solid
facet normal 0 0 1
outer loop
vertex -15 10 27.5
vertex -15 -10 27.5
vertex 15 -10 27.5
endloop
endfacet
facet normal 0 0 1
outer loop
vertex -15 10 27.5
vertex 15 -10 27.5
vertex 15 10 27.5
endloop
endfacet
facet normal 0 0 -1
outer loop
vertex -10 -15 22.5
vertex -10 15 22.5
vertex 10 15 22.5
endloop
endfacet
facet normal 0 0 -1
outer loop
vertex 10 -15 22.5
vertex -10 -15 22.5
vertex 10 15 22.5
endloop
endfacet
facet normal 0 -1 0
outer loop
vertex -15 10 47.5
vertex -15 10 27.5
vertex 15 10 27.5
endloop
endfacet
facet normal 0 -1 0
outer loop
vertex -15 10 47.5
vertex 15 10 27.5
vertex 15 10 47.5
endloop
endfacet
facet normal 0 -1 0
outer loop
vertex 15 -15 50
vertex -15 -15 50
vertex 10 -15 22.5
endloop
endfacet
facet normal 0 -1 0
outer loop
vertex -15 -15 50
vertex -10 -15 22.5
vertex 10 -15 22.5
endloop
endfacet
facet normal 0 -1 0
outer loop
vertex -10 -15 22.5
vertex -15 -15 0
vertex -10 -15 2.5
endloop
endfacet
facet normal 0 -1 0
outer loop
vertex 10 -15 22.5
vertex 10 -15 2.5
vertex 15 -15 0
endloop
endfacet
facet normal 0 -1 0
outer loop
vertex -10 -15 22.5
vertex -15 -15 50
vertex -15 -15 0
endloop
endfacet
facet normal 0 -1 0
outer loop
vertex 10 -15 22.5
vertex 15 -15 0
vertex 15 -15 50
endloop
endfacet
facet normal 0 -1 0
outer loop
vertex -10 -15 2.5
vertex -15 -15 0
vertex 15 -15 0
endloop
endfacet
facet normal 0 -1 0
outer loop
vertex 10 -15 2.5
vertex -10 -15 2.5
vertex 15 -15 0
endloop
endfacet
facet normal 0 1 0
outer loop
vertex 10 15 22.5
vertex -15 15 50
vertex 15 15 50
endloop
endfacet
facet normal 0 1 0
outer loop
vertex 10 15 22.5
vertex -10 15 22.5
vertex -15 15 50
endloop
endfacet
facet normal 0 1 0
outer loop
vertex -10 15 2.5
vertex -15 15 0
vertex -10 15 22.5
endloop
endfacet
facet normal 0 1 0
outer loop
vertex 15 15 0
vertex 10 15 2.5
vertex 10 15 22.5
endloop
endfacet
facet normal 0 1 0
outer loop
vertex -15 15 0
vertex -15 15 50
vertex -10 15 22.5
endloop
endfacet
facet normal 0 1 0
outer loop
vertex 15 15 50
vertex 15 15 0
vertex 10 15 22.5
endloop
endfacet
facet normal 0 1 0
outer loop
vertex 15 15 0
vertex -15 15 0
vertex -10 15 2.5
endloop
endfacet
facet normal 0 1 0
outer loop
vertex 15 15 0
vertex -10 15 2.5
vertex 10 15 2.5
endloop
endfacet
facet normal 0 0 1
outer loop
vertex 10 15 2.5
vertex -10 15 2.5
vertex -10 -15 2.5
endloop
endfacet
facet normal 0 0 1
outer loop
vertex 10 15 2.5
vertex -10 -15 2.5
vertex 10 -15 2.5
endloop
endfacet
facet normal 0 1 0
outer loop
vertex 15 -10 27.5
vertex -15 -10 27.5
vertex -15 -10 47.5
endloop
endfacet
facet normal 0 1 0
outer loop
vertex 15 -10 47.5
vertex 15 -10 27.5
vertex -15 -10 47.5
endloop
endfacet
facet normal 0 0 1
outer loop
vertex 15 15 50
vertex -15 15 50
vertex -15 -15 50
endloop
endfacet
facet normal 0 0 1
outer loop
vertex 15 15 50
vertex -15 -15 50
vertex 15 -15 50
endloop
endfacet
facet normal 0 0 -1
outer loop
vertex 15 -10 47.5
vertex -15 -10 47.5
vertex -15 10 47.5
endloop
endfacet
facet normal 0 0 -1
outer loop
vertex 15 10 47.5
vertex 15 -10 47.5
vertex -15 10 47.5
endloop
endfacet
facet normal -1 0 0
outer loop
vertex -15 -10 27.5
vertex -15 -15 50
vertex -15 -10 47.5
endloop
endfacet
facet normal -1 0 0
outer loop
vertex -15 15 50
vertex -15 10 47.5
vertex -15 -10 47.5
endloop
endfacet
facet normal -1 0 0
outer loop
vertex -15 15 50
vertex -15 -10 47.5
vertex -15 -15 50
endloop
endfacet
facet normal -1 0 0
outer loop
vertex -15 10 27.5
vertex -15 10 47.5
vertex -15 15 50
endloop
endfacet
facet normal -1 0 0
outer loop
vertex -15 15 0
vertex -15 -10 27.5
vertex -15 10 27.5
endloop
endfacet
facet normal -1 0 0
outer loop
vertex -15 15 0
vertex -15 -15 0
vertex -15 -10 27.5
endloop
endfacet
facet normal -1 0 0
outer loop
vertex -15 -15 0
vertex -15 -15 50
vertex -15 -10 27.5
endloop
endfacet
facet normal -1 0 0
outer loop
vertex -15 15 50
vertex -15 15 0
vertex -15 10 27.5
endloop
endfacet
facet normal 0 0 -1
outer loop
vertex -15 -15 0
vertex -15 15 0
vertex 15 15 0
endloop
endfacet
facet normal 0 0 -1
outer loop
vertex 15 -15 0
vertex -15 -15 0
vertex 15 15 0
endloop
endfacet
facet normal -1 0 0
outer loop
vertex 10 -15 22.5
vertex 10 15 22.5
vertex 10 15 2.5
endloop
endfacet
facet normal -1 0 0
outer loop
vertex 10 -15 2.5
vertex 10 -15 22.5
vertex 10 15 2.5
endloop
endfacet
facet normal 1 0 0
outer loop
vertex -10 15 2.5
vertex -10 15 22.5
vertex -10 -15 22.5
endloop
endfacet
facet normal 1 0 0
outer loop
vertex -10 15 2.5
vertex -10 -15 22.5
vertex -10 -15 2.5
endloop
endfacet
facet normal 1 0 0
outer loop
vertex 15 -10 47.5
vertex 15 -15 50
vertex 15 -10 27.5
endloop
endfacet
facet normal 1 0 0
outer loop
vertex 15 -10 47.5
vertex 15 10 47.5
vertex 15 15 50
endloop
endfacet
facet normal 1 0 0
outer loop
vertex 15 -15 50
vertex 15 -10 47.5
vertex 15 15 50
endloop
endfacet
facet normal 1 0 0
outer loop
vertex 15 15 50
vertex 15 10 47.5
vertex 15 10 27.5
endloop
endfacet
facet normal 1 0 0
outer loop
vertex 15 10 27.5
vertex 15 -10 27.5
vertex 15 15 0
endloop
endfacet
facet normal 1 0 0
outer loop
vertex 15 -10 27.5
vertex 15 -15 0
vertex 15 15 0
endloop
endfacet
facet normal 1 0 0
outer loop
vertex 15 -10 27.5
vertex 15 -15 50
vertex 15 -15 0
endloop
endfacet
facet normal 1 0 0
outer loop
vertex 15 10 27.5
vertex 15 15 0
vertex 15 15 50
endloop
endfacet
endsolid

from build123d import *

# Parameters (mm, degrees)
SKETCH1_W           = 30
SKETCH1_H           = 30
BOSS_EXTRUDE1_DEPTH = 50
SKETCH3_W           = 20
SKETCH3_H           = 20
CUT_EXTRUDE1_DEPTH  = 61.207972894
SKETCH4_W           = 20
SKETCH4_H           = 20
CUT_EXTRUDE2_DEPTH  = 61.207972894


with BuildPart() as part:
    # Sketch1 → Boss-Extrude1 (new body)
    with BuildSketch(Plane.XY):
        Rectangle(SKETCH1_W, SKETCH1_H)
    extrude(amount=BOSS_EXTRUDE1_DEPTH)

    # Sketch3 → Cut-Extrude1 (cut, through all)
    with BuildSketch(Plane.ZY.offset(15)):
        with Locations((37.5, 0)):
            Rectangle(SKETCH3_W, SKETCH3_H)
    extrude(amount=-CUT_EXTRUDE1_DEPTH, mode=Mode.SUBTRACT)

    # Sketch4 → Cut-Extrude2 (cut, through all)
    with BuildSketch(Plane(origin=(0, 15, 0), x_dir=(1, 0, 0), z_dir=(0, 1, 0))):
        with Locations((0, -12.5)):
            Rectangle(SKETCH4_W, SKETCH4_H)
    extrude(amount=-CUT_EXTRUDE2_DEPTH, mode=Mode.SUBTRACT)


solid = part.part
